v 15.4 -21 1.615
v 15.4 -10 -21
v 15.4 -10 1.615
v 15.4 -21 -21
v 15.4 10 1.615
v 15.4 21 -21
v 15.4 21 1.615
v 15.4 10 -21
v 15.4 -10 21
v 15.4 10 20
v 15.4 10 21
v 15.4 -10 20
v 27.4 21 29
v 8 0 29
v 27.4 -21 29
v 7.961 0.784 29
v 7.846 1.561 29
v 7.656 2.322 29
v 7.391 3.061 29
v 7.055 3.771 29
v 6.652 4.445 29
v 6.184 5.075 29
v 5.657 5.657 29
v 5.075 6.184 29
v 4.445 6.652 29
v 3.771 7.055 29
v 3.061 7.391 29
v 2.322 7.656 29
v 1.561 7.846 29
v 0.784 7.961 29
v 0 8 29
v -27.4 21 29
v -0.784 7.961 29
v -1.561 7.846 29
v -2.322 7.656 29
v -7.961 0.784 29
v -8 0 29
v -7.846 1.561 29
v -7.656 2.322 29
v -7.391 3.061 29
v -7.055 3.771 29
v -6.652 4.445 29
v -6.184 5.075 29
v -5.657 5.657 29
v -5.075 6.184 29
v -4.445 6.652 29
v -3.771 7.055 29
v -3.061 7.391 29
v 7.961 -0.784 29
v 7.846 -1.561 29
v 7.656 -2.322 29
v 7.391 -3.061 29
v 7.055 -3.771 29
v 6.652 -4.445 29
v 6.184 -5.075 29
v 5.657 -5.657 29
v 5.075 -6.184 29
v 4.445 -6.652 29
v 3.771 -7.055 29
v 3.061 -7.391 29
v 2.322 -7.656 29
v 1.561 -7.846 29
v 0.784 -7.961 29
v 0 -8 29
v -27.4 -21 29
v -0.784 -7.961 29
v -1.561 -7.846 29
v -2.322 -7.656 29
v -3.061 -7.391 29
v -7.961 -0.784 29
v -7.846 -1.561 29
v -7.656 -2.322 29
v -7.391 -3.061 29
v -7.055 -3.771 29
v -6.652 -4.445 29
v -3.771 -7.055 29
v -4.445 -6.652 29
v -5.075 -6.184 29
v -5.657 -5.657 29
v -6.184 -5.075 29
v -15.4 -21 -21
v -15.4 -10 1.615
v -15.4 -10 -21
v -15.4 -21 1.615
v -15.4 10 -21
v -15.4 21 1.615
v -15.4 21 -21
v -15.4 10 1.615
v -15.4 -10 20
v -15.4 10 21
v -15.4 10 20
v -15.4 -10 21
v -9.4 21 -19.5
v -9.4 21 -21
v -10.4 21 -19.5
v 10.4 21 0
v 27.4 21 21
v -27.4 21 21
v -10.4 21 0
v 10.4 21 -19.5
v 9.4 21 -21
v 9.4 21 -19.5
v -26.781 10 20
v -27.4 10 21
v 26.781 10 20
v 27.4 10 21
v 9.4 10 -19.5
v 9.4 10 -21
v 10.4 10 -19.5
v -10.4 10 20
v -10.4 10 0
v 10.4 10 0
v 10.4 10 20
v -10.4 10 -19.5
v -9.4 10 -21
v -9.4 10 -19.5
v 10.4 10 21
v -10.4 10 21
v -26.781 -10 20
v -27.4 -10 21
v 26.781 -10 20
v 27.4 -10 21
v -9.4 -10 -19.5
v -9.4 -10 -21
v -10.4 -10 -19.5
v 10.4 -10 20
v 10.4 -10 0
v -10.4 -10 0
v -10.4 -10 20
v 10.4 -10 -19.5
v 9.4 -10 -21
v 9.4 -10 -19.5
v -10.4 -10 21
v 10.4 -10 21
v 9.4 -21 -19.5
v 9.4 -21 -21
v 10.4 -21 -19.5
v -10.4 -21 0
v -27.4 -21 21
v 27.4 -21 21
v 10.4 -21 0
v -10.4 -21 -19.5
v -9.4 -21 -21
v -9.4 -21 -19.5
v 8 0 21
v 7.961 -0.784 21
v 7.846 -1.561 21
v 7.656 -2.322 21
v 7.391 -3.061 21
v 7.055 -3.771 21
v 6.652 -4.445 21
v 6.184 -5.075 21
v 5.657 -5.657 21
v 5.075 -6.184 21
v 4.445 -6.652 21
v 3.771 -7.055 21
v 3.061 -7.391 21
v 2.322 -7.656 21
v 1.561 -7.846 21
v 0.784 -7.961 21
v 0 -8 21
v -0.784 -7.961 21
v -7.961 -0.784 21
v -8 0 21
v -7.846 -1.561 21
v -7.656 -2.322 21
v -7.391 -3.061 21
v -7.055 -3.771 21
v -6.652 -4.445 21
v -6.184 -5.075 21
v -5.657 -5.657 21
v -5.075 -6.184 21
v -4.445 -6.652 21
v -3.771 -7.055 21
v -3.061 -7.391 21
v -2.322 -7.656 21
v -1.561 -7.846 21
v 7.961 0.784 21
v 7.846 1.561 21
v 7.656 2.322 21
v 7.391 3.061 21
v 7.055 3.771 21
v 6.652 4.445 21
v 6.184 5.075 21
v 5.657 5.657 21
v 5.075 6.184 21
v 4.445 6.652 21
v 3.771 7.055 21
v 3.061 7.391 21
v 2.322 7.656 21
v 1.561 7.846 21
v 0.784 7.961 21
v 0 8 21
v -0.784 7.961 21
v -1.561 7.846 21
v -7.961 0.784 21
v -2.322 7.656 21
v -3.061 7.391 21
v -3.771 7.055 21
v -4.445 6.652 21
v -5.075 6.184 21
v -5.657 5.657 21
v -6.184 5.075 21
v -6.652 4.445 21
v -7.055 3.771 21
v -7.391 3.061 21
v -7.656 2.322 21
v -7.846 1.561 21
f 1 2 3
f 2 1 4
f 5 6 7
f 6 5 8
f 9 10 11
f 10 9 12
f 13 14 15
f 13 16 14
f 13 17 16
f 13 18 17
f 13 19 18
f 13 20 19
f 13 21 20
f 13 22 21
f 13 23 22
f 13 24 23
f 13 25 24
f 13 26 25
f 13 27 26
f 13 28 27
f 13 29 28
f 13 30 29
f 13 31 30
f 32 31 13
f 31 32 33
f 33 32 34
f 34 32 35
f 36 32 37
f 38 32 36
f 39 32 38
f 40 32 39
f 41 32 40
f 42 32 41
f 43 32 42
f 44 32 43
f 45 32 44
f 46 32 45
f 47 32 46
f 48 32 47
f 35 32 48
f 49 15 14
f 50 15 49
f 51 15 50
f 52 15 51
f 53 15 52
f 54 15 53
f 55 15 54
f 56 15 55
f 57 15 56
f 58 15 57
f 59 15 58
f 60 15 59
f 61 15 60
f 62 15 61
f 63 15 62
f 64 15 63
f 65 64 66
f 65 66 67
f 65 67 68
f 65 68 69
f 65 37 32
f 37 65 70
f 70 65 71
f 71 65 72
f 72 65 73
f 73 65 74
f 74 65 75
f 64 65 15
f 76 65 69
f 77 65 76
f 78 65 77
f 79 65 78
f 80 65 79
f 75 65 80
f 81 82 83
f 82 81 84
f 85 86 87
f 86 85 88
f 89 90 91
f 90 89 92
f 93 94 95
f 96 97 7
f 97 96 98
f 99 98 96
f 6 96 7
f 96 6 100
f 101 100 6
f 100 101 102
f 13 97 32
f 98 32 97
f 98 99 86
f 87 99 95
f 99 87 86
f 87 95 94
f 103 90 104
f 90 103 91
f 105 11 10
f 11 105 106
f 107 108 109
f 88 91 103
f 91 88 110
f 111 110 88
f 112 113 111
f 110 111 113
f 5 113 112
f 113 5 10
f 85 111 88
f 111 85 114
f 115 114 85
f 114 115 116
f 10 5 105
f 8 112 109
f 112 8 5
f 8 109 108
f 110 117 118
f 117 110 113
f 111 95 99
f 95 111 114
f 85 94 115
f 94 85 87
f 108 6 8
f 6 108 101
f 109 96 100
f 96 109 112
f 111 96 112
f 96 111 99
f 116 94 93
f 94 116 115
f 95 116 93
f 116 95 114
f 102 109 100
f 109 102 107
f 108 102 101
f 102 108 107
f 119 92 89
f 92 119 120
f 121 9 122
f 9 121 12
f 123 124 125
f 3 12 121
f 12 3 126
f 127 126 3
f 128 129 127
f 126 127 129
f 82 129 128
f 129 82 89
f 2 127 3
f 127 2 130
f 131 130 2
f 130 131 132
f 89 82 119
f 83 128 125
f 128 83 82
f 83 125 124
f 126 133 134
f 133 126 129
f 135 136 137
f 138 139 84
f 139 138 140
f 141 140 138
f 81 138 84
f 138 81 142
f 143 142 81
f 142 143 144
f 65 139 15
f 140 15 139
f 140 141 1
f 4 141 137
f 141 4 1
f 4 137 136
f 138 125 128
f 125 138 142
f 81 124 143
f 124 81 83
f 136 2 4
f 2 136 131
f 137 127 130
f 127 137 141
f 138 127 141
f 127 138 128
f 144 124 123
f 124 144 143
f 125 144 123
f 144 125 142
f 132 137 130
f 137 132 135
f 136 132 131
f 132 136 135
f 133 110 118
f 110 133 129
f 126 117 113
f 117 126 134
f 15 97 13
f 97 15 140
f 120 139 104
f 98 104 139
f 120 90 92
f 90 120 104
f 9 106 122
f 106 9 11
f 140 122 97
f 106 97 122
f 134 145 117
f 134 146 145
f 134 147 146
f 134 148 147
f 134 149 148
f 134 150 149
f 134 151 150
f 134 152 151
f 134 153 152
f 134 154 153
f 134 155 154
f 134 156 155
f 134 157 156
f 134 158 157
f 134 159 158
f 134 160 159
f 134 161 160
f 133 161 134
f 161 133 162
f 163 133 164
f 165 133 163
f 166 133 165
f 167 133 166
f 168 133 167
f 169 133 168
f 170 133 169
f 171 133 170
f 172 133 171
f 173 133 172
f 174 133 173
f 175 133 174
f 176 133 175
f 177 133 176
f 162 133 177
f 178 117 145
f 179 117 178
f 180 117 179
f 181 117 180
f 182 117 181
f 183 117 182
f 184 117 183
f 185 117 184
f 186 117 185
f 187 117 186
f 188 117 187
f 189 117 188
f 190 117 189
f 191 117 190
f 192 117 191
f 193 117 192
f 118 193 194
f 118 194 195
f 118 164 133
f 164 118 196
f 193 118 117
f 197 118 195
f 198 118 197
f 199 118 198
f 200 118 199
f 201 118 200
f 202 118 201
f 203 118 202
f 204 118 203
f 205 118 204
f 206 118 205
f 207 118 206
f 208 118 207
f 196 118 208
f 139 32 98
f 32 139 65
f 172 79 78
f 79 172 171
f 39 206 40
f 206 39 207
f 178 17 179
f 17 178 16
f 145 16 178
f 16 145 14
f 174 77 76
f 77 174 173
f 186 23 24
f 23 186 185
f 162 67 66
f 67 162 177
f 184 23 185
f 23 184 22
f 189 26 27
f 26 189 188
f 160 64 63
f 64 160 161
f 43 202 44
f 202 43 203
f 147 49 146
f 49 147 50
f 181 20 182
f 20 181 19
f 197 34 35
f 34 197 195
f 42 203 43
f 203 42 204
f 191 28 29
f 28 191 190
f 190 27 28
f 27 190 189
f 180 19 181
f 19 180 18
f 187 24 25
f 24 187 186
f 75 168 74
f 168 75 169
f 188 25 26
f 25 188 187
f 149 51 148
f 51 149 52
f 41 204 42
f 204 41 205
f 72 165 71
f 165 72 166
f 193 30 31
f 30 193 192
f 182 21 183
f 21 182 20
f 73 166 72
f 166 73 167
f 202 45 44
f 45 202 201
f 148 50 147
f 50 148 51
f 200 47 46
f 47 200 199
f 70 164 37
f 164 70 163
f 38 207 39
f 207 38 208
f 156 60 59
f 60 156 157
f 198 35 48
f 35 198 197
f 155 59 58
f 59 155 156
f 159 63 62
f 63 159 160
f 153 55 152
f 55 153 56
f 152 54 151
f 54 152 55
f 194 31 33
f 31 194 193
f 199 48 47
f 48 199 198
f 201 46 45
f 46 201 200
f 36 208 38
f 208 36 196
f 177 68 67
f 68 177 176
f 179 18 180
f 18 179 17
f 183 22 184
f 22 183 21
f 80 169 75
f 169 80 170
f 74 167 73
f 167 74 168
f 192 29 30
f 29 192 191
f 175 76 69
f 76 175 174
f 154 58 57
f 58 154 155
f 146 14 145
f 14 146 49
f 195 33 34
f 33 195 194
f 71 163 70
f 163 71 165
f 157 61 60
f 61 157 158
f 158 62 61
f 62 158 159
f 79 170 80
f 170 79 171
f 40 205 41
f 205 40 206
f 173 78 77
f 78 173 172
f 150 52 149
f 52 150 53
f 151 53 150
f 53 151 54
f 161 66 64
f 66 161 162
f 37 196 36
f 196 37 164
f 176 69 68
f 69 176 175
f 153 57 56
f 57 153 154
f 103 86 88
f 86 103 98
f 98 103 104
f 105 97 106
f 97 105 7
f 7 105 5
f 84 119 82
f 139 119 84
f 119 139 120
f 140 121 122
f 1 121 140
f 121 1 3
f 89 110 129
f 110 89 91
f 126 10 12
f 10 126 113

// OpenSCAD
// file: ../perpendicular-u-joint-guard-v1.3-triangular-corner-fills/candidate_triangular_corner_fills.scad
// Candidate v1.3: four triangular concave-corner fill blocks.
//
// Base: accepted v0.7 eaves12 geometry. v0.9/v1.0/v1.1/v1.2 are not
// imported. Each corner block is a real triangular prism: broad at the roof,
// tapering continuously toward z=0, and overlapping the U side wall.

use <../perpendicular-u-joint-guard-v0.7/perpendicular_double_u_guard.scad>;

$fn = 48;
PART = "candidate_iso";

// Explicit v0.7 interface values.
roof_x_outer = 27.4;       // accepted eaves12 roof: -27.4..+27.4
side_wall_x_outer = 15.4;  // existing side-wall outer edge
blue_tube_x_outer = 10.0;  // blue lower 20x20 tube half-width
plate_y_inner = 10.0;
plate_y_outer = 21.0;
plate_depth_y = plate_y_outer - plate_y_inner; // 11 mm per front/back U plate

// The top edge is 0.5 mm inside the roof volume (roof underside z=21), and
// the lower point enters the side wall by 1 mm in X.  The XZ area therefore
// has positive overlap at both ends, not edge-only contact.
triangle_top_z = 21.5;
triangle_bottom_z = 0.0;
triangle_roof_overlap_z = triangle_top_z - 21.0;
triangle_side_overlap_x = 1.0;
triangle_inner_x = side_wall_x_outer - triangle_side_overlap_x; // 14.4

// Bottom retaining-hook contract copied from v0.7 for explicit verification.
hook_height_z = 1.5;
u_bottom_z = -21.0;
hook_top_z = u_bottom_z + hook_height_z; // -19.5

assert(plate_depth_y == 11, "每个三角块的前后板深必须是 11 mm");
assert(triangle_top_z > 21 && triangle_bottom_z == 0,
       "三角块上端必须搭入屋檐、下端落到 z=0");
assert(triangle_inner_x > blue_tube_x_outer,
       "三角块下端不得进入蓝色方管 x=-10..+10 包络");
assert(triangle_side_overlap_x > 0 && triangle_roof_overlap_z > 0,
       "三角块必须与屋檐和侧墙都有正重叠");
assert(hook_height_z == 1.5 && u_bottom_z == -21 && hook_top_z == -19.5,
       "底部卡脚必须保持 z=-21..-19.5");

// A polygon in XZ is extruded only through the corresponding front/back U
// plate. The center y=-10..+10 passage remains open.
module triangular_fill_xz(points, yc) {
    translate([0, yc, 0])
        rotate([90, 0, 0])
            linear_extrude(height = plate_depth_y,
                           center = true,
                           convexity = 10)
                polygon(points = points);
}

module front_neg_x_triangle() {
    // -X roof end -> +X inward. Top wide, lower point at the side wall.
    triangular_fill_xz([
        [-roof_x_outer, 21.0],
        [-triangle_inner_x, triangle_top_z],
        [-triangle_inner_x, triangle_bottom_z]
    ], (plate_y_inner + plate_y_outer) / 2);
}

module front_pos_x_triangle() {
    // +X roof end -> -X inward. Mirrored triangle.
    triangular_fill_xz([
        [roof_x_outer, 21.0],
        [triangle_inner_x, triangle_top_z],
        [triangle_inner_x, triangle_bottom_z]
    ], (plate_y_inner + plate_y_outer) / 2);
}

module back_neg_x_triangle() {
    triangular_fill_xz([
        [-roof_x_outer, 21.0],
        [-triangle_inner_x, triangle_top_z],
        [-triangle_inner_x, triangle_bottom_z]
    ], -(plate_y_inner + plate_y_outer) / 2);
}

module back_pos_x_triangle() {
    triangular_fill_xz([
        [roof_x_outer, 21.0],
        [triangle_inner_x, triangle_top_z],
        [triangle_inner_x, triangle_bottom_z]
    ], -(plate_y_inner + plate_y_outer) / 2);
}

module front_two_triangular_fills() {
    union() {
        front_neg_x_triangle();
        front_pos_x_triangle();
    }
}

module back_two_triangular_fills() {
    union() {
        back_neg_x_triangle();
        back_pos_x_triangle();
    }
}

module all_four_triangular_fills() {
    union() {
        front_two_triangular_fills();
        back_two_triangular_fills();
    }
}

module candidate_print_solid() {
    // Final hole operation is deliberately after the complete four-block
    // union; this preserves a true Z through-hole and the round nut pocket.
    difference() {
        union() {
            double_u_clip();
            all_four_triangular_fills();
        }
        vertical_screw_relief();
    }
}

module candidate_clip() {
    candidate_print_solid();
}

module candidate_assembly_iso() {
    upper_long_tube();
    lower_cross_tube();
    color([0.96, 0.39, 0.08]) double_u_clip();
    color([0.86, 0.13, 0.08]) front_two_triangular_fills();
    color([0.62, 0.12, 0.52]) back_two_triangular_fills();
    vertical_joint_screw();
}

module candidate_front_xz() {
    lower_cross_tube();
    color([0.96, 0.39, 0.08]) double_u_clip();
    color([0.86, 0.13, 0.08]) front_two_triangular_fills();
    vertical_joint_screw();
}

module candidate_back_xz() {
    lower_cross_tube();
    color([0.96, 0.39, 0.08]) double_u_clip();
    color([0.62, 0.12, 0.52]) back_two_triangular_fills();
    vertical_joint_screw();
}

module candidate_top_slice() {
    // At z=-0.5..2.5 the four blocks show their two front/back 11 mm bands;
    // the blue tube and the central y gap remain visible.
    slice_box = 200;
    color([0.28, 0.45, 0.78])
        intersection() {
            lower_cross_tube();
            translate([-slice_box / 2, -slice_box / 2, -0.5])
                cube([slice_box, slice_box, 3.0]);
        }
    color([0.96, 0.39, 0.08])
        intersection() {
            double_u_clip();
            translate([-slice_box / 2, -slice_box / 2, -0.5])
                cube([slice_box, slice_box, 3.0]);
        }
    color([0.86, 0.13, 0.08])
        intersection() {
            front_two_triangular_fills();
            translate([-slice_box / 2, -slice_box / 2, -0.5])
                cube([slice_box, slice_box, 3.0]);
        }
    color([0.62, 0.12, 0.52])
        intersection() {
            back_two_triangular_fills();
            translate([-slice_box / 2, -slice_box / 2, -0.5])
                cube([slice_box, slice_box, 3.0]);
        }
}

module candidate_hole_section() {
    // Center y=0 section: the bore and round nut pocket are shown without
    // confusing them with the bottom hook, which is outside this section.
    intersection() {
        candidate_print_solid();
        translate([-100, -0.4, -100]) cube([200, 0.8, 200]);
    }
}

module candidate_hook_check() {
    // Isolated lower detail: exact imported v0.7 U plate and blue tube, with
    // hook volumes highlighted only for review. This is not the print union.
    detail_box = 200;
    detail_z0 = -22;
    detail_h = 5;
    detail_y0 = 8;
    detail_ydepth = 15;
    intersection() {
        lower_cross_tube();
        translate([-detail_box / 2, detail_y0, detail_z0])
            cube([detail_box, detail_ydepth, detail_h]);
    }
    color([0.96, 0.39, 0.08])
        intersection() {
            u_plate(plate_y_inner, plate_y_outer);
            translate([-detail_box / 2, detail_y0, detail_z0])
                cube([detail_box, detail_ydepth, detail_h]);
        }
    color([0.20, 0.78, 0.20])
        intersection() {
            union() {
                translate([-13.65, 15.5, -20.25])
                    cube([3.5, 11, 1.5], center = true);
                translate([13.65, 15.5, -20.25])
                    cube([3.5, 11, 1.5], center = true);
            }
            translate([-detail_box / 2, detail_y0, detail_z0])
                cube([detail_box, detail_ydepth, detail_h]);
        }
}

if (PART == "candidate_clip") {
    candidate_clip();
} else if (PART == "candidate_front_xz") {
    candidate_front_xz();
} else if (PART == "candidate_back_xz") {
    candidate_back_xz();
} else if (PART == "candidate_top_slice") {
    candidate_top_slice();
} else if (PART == "candidate_hole_section") {
    candidate_hole_section();
} else if (PART == "candidate_hook_check") {
    candidate_hook_check();
} else {
    candidate_assembly_iso();
}
// file: ../perpendicular-u-joint-guard-v1.4-full-nut-passage/full_nut_passage_guard.scad
// v1.4: keep the exact v1.3 body; remove the nut-pocket floor with one
// full-depth Ø16 cylindrical subtraction. Units: mm; Z positive upwards.
// Imported v1.3 geometry contains all four triangles and the lower hooks.
use <../perpendicular-u-joint-guard-v1.3-triangular-corner-fills/candidate_triangular_corner_fills.scad>;

$fn = 48;
PART = "clip";
nut_passage_d = 16.0;

module full_depth_nut_passage() {
    // Cutter extends z=-31..39, past the whole printed z=-21..29 envelope.
    // 64 facets match the existing Ø16 pocket, avoiding a stepped profile.
    translate([0, 0, 4])
        cylinder(d = nut_passage_d, h = 70, center = true, $fn = 64);
}

module guard_v1_4() {
    difference() {
        candidate_print_solid();
        full_depth_nut_passage();
    }
}

guard_v1_4();
// main file
// v1.5: v1.4 Ø16 full nut passage + minimum downward-entry upper-tube slot.
// Units mm. X: upper long tube; Y: blue foot/front-back; Z: up.
use <../perpendicular-u-joint-guard-v1.4-full-nut-passage/full_nut_passage_guard.scad>;

$fn = 48;

module upper_pipe_vertical_entry_slot() {
    // Fixed gray upper tube: x=-60..60, y=-10..10, z=0..20.
    // While the clip moves down, that tube sweeps upward in clip coordinates.
    // A bottom-open slot ending at z=20 covers its whole relevant sweep in
    // the printed z=-21..29 envelope. Roof underside remains at z=21.
    // Preserve exact 20 mm Y width rather than silently adding fit clearance.
    translate([-60, -10, -31]) cube([120, 20, 51]);
}

module guard_v1_5() {
    difference() {
        guard_v1_4();
        upper_pipe_vertical_entry_slot();
    }
}

guard_v1_5();
